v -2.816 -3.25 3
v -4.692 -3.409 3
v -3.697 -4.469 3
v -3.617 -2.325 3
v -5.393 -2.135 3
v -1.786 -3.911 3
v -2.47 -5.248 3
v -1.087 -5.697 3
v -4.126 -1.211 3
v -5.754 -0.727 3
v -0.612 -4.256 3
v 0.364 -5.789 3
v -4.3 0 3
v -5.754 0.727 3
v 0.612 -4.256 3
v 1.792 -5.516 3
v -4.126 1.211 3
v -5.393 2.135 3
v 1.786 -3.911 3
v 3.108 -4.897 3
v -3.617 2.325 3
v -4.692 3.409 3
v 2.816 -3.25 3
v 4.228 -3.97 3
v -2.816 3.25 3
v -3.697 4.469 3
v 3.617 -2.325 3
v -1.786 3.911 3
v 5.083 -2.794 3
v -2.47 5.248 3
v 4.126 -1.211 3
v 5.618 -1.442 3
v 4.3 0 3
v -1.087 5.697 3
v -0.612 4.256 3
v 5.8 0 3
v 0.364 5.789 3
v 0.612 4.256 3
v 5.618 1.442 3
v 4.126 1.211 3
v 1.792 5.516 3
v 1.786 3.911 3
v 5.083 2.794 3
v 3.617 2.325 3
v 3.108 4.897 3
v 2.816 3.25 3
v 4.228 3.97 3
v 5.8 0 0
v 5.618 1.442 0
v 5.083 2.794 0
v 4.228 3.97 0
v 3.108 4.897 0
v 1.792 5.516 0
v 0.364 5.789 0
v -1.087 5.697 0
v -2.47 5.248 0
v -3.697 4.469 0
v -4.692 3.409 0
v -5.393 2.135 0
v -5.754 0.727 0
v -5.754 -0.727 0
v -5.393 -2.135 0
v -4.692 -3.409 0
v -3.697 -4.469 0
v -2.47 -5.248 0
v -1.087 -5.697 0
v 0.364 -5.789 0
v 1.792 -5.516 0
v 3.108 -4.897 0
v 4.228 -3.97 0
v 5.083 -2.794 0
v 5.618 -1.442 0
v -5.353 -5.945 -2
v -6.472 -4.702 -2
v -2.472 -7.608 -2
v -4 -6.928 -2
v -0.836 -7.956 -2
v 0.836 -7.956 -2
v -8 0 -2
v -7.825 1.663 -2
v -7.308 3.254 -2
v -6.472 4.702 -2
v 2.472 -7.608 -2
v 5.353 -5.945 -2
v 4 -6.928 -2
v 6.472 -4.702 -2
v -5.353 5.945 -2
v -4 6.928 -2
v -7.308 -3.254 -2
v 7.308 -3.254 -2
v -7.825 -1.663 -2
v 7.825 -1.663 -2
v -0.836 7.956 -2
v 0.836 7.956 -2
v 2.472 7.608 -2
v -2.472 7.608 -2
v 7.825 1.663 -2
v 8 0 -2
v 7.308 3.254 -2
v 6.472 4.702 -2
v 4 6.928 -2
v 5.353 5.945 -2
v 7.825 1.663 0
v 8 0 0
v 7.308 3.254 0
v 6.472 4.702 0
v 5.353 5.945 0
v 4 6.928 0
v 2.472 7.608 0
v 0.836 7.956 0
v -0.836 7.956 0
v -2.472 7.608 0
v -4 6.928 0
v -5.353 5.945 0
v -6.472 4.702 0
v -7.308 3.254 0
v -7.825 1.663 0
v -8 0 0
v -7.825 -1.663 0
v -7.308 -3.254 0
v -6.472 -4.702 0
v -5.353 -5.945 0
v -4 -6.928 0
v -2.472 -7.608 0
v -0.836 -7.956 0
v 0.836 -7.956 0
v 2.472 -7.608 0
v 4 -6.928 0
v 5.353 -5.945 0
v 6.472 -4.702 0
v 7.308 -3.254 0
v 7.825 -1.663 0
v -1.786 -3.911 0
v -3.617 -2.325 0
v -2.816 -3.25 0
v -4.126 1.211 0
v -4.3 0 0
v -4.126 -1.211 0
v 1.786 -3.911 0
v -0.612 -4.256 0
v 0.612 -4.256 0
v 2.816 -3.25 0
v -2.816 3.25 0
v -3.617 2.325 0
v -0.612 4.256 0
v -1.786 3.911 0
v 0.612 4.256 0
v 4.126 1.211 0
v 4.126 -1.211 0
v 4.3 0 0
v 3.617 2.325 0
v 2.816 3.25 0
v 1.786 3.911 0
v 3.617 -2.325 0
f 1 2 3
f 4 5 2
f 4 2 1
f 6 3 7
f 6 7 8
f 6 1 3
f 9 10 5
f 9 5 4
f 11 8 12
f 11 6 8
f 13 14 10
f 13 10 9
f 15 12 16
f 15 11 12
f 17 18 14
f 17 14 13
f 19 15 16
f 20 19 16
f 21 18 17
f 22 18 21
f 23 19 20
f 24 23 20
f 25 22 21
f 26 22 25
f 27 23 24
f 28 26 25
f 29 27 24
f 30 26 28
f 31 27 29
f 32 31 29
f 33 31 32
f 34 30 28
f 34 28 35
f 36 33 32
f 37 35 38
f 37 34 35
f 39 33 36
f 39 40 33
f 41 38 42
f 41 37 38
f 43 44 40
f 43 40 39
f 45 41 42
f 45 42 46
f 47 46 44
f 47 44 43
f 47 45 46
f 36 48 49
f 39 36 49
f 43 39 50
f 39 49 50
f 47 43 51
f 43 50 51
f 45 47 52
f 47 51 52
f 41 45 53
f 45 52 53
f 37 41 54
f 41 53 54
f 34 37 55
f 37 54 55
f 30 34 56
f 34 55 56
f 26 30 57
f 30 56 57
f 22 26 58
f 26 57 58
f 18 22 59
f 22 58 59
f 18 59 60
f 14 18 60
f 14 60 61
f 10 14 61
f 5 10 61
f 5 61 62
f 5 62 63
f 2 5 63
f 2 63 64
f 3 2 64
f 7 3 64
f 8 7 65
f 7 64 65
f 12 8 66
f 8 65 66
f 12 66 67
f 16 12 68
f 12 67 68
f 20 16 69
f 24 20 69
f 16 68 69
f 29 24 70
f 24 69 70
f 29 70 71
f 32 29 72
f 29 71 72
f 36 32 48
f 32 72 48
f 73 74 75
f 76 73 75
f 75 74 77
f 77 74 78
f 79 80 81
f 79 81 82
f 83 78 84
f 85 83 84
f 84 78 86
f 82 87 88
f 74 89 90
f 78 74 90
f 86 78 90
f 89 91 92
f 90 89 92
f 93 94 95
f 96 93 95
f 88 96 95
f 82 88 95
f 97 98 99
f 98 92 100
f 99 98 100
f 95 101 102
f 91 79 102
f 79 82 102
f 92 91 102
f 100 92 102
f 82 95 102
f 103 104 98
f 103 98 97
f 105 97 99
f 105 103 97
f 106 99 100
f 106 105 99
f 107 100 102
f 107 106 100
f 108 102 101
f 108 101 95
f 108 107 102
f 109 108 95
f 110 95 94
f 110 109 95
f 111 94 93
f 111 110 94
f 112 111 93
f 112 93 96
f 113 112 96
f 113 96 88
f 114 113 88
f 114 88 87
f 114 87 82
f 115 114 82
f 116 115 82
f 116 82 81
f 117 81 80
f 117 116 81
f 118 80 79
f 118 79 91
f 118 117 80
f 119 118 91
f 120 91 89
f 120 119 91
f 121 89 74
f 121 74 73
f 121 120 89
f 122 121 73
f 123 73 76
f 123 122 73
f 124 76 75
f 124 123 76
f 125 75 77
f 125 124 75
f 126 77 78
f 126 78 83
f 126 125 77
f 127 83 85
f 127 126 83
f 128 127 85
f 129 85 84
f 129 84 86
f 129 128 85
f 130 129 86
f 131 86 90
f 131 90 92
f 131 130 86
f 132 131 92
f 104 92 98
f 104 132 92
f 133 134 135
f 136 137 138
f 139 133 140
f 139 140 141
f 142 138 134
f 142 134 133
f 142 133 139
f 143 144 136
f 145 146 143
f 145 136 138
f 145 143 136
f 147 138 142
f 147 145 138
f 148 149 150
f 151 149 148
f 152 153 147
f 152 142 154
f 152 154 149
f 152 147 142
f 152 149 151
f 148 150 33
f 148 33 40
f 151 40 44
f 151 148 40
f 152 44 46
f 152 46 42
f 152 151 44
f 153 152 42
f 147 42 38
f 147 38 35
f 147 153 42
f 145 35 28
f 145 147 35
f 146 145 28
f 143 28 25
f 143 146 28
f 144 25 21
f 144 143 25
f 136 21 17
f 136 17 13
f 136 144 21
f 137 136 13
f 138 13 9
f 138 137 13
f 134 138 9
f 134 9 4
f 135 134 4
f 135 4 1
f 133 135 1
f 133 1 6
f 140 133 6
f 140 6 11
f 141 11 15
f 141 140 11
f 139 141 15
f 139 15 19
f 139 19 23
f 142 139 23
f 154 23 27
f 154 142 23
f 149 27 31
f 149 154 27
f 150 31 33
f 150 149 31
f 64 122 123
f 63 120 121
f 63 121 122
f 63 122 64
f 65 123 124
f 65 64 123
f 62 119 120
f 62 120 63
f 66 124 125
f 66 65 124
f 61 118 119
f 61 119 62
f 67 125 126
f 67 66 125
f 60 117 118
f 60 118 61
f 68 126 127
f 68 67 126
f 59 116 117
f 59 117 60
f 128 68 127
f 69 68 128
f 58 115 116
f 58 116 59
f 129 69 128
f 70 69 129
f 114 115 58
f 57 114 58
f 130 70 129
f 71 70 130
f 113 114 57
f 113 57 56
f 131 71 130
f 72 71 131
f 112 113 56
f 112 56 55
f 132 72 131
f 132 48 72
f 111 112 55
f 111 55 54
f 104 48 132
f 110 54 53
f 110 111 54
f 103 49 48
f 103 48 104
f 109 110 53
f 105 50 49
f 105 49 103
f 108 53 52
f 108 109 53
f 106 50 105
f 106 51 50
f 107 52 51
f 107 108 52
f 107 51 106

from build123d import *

# Parameters (mm, degrees)
F0_R     = 5.8
F0_R_2   = 4.3
F1_DEPTH = 3
F0_R_3   = 8
F2_DEPTH = 2


with BuildPart() as f1:
    # F0 (on Top) → F1 (new body)
    with BuildSketch(Plane.XY):
        Circle(F0_R)
        Circle(F0_R_2, mode=Mode.SUBTRACT)
    extrude(amount=F1_DEPTH)

    # F0 (on Top) → F2 (join)
    with BuildSketch(Plane.XY):
        Circle(F0_R_3)
        Circle(F0_R, mode=Mode.SUBTRACT)
        Circle(F0_R)
        Circle(F0_R_2, mode=Mode.SUBTRACT)
        Circle(F0_R_2)
    extrude(amount=-F2_DEPTH)


solid = f1.part
